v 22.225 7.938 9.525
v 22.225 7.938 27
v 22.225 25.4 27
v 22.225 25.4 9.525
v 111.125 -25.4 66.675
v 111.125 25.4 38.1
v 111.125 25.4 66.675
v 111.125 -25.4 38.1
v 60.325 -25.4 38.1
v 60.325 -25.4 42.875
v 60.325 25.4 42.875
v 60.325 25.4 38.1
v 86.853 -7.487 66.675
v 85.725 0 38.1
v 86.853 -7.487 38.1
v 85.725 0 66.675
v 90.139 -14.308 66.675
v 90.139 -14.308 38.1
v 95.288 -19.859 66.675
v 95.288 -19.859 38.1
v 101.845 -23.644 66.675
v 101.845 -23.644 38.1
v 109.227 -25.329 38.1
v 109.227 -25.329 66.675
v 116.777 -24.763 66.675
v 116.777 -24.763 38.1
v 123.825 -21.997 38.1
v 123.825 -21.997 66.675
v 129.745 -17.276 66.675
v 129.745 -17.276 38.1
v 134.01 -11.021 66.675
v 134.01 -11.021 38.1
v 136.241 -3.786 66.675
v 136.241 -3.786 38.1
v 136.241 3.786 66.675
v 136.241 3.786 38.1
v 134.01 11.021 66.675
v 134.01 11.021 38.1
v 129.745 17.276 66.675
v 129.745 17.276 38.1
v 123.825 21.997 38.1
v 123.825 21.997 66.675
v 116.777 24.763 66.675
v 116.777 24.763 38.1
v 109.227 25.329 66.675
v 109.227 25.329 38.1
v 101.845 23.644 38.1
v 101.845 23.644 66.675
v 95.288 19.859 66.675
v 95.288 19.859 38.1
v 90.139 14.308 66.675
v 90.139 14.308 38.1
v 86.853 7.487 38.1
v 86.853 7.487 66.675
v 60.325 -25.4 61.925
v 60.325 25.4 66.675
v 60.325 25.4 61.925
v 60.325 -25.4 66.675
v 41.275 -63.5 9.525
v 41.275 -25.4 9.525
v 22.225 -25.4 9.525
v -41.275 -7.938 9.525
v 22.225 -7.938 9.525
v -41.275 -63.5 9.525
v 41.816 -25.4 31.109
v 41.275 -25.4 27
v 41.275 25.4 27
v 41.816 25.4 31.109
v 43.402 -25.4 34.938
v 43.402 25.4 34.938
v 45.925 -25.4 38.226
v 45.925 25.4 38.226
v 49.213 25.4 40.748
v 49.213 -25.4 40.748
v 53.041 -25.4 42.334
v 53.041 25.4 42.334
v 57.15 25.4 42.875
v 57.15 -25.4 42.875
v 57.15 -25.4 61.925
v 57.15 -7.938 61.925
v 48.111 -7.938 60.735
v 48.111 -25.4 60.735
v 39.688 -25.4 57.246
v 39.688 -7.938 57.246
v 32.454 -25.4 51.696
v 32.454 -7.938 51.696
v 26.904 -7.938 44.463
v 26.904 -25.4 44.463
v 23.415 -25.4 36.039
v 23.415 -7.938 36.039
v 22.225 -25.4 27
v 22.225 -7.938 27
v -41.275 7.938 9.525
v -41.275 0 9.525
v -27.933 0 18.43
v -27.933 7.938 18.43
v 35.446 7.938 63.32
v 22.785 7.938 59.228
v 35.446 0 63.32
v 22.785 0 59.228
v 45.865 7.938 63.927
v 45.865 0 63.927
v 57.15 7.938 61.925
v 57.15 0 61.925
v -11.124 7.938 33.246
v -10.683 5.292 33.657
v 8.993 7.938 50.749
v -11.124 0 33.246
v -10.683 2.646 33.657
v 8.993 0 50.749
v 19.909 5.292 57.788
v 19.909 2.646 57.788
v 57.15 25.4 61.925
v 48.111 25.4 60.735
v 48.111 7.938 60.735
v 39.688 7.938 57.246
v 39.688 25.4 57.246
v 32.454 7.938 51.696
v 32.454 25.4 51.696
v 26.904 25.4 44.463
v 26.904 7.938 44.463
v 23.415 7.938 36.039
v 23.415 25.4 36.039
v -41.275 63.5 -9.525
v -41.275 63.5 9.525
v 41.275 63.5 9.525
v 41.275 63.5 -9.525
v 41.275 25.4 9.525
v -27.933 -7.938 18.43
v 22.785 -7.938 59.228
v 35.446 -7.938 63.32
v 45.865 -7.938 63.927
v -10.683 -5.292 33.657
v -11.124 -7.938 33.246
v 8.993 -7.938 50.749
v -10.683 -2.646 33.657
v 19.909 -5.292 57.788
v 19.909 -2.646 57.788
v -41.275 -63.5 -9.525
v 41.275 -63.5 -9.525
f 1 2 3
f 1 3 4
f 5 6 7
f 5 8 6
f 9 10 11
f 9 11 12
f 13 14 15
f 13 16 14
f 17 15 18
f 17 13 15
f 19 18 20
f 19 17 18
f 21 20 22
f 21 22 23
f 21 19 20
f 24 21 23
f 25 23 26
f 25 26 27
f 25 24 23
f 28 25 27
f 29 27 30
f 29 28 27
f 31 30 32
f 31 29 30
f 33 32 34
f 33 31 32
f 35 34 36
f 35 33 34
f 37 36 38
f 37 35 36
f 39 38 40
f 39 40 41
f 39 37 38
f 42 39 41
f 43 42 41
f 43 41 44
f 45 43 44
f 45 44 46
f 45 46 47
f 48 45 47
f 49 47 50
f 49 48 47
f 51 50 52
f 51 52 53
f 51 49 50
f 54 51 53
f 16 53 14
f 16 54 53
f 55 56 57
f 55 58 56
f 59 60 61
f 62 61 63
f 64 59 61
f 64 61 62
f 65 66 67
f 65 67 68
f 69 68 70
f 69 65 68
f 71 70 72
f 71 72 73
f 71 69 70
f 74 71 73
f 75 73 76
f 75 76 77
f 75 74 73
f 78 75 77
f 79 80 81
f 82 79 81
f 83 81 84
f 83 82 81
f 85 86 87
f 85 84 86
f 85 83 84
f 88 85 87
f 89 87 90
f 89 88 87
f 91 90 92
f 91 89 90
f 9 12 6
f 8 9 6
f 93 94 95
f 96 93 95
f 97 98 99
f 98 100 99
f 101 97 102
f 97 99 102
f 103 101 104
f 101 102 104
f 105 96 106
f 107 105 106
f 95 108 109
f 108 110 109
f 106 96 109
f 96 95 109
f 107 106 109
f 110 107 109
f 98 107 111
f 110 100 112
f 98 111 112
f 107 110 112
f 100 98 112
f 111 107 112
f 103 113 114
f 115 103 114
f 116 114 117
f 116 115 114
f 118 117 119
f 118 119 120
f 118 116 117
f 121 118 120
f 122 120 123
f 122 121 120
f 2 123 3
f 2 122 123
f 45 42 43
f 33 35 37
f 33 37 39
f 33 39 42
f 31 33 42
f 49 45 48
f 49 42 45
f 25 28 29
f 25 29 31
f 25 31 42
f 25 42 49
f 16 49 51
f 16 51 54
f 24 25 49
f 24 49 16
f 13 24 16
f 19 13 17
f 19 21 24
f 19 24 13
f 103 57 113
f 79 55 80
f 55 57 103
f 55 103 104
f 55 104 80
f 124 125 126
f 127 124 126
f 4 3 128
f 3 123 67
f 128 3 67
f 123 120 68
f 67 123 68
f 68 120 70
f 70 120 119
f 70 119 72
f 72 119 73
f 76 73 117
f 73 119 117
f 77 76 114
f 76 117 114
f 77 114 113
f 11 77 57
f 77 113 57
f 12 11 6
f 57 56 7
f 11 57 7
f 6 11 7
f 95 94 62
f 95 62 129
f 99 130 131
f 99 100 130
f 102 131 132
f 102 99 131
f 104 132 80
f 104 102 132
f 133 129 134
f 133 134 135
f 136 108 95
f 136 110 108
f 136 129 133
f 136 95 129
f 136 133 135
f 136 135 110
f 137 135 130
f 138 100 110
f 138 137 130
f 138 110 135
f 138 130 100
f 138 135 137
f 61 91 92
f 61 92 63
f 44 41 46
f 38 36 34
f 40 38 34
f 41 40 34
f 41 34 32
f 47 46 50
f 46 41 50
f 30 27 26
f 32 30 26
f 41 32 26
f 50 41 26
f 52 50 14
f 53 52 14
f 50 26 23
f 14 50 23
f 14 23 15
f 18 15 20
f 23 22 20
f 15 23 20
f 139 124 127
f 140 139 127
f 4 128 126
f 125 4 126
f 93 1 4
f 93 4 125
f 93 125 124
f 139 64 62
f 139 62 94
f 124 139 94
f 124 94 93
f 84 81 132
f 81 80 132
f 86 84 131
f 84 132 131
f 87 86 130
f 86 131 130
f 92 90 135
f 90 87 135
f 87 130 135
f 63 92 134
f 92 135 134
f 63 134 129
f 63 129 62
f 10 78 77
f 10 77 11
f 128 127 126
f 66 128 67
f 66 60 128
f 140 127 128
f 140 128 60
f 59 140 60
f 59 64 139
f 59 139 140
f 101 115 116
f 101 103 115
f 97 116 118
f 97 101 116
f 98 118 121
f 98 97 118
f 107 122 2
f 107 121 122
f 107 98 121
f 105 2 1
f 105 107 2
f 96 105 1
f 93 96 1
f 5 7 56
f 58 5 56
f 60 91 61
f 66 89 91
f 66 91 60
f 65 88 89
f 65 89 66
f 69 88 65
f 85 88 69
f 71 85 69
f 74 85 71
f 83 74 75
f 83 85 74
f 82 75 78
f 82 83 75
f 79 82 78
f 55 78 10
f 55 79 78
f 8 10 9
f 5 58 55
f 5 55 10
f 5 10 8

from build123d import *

# Parameters (mm, degrees)
F1_DEPTH = 63.5
F0_W     = 25.4
F0_H     = 28.575
F0_W_2   = 21.3542111911
F0_H_2   = 19.05
F2_DEPTH = 25.4
F3_DEPTH = 7.9375


with BuildPart() as f1:
    # F0 (on Front) → F1 (new body, symmetric)
    with BuildSketch(Plane.XZ):
        Polygon((-41.275, 9.525), (-41.275, -9.525), (41.275, -9.525), (41.275, 9.525), (22.225, 9.525), align=None)
    extrude(amount=F1_DEPTH, both=True)

    # F0 (on Front) → F2 (join, symmetric)
    with BuildSketch(Plane.XZ):
        Polygon((60.325, 66.675), (60.325, 61.9252), (81.6792111911, 61.9252), (81.6792111911, 42.8752), (60.325, 42.8752), (60.325, 38.1), (85.725, 38.1), (85.725, 66.675), align=None)
        with Locations((98.425, 52.3875)):
            Rectangle(F0_W, F0_H)
        with Locations((71.0021055956, 52.4002)):
            Rectangle(F0_W_2, F0_H_2)
        with BuildLine():
            Line((22.225, 9.525), (41.275, 9.525))
            Line((41.275, 9.525), (41.275, 27.0002))
            ThreePointArc((41.275, 27.0002), (45.9246798487, 38.2255201513), (57.15, 42.8752))
            Line((57.15, 42.8752), (60.325, 42.8752))
            Line((60.325, 42.8752), (60.325, 61.9252))
            Line((60.325, 61.9252), (57.15, 61.9252))
            ThreePointArc((57.15, 61.9252), (32.4542956671, 51.6959043329), (22.225, 27.0002))
            Line((22.225, 27.0002), (22.225, 9.525))
        make_face()
    extrude(amount=F2_DEPTH, both=True)

    # F0 (on Front) → F3 (join, symmetric)
    with BuildSketch(Plane.XZ):
        with BuildLine():
            add(Edge.make_bspline(
                [(-41.275, 9.525), (-8.4666666667, 26.9917333333), (14.3675776199, 74.4502022862), (57.15, 61.9252)],
                knots=[0, 0, 0, 0, 111.5045361635, 111.5045361635, 111.5045361635, 111.5045361635], degree=3))
            Line((-41.275, 9.525), (22.225, 9.525))
            Line((22.225, 9.525), (22.225, 27.0002))
            ThreePointArc((22.225, 27.0002), (32.4542956671, 51.6959043329), (57.15, 61.9252))
        make_face()
    extrude(amount=F3_DEPTH, both=True)


with BuildPart() as f4:
    # F0 (on Front) → F4 (revolve)
    with BuildSketch(Plane.XZ):
        with Locations((98.425, 52.3875)):
            Rectangle(F0_W, F0_H)
    revolve(axis=Axis((111.125, 0, 52.3875), (0, 0, 1)))


solid = Compound([f1.part, f4.part])
